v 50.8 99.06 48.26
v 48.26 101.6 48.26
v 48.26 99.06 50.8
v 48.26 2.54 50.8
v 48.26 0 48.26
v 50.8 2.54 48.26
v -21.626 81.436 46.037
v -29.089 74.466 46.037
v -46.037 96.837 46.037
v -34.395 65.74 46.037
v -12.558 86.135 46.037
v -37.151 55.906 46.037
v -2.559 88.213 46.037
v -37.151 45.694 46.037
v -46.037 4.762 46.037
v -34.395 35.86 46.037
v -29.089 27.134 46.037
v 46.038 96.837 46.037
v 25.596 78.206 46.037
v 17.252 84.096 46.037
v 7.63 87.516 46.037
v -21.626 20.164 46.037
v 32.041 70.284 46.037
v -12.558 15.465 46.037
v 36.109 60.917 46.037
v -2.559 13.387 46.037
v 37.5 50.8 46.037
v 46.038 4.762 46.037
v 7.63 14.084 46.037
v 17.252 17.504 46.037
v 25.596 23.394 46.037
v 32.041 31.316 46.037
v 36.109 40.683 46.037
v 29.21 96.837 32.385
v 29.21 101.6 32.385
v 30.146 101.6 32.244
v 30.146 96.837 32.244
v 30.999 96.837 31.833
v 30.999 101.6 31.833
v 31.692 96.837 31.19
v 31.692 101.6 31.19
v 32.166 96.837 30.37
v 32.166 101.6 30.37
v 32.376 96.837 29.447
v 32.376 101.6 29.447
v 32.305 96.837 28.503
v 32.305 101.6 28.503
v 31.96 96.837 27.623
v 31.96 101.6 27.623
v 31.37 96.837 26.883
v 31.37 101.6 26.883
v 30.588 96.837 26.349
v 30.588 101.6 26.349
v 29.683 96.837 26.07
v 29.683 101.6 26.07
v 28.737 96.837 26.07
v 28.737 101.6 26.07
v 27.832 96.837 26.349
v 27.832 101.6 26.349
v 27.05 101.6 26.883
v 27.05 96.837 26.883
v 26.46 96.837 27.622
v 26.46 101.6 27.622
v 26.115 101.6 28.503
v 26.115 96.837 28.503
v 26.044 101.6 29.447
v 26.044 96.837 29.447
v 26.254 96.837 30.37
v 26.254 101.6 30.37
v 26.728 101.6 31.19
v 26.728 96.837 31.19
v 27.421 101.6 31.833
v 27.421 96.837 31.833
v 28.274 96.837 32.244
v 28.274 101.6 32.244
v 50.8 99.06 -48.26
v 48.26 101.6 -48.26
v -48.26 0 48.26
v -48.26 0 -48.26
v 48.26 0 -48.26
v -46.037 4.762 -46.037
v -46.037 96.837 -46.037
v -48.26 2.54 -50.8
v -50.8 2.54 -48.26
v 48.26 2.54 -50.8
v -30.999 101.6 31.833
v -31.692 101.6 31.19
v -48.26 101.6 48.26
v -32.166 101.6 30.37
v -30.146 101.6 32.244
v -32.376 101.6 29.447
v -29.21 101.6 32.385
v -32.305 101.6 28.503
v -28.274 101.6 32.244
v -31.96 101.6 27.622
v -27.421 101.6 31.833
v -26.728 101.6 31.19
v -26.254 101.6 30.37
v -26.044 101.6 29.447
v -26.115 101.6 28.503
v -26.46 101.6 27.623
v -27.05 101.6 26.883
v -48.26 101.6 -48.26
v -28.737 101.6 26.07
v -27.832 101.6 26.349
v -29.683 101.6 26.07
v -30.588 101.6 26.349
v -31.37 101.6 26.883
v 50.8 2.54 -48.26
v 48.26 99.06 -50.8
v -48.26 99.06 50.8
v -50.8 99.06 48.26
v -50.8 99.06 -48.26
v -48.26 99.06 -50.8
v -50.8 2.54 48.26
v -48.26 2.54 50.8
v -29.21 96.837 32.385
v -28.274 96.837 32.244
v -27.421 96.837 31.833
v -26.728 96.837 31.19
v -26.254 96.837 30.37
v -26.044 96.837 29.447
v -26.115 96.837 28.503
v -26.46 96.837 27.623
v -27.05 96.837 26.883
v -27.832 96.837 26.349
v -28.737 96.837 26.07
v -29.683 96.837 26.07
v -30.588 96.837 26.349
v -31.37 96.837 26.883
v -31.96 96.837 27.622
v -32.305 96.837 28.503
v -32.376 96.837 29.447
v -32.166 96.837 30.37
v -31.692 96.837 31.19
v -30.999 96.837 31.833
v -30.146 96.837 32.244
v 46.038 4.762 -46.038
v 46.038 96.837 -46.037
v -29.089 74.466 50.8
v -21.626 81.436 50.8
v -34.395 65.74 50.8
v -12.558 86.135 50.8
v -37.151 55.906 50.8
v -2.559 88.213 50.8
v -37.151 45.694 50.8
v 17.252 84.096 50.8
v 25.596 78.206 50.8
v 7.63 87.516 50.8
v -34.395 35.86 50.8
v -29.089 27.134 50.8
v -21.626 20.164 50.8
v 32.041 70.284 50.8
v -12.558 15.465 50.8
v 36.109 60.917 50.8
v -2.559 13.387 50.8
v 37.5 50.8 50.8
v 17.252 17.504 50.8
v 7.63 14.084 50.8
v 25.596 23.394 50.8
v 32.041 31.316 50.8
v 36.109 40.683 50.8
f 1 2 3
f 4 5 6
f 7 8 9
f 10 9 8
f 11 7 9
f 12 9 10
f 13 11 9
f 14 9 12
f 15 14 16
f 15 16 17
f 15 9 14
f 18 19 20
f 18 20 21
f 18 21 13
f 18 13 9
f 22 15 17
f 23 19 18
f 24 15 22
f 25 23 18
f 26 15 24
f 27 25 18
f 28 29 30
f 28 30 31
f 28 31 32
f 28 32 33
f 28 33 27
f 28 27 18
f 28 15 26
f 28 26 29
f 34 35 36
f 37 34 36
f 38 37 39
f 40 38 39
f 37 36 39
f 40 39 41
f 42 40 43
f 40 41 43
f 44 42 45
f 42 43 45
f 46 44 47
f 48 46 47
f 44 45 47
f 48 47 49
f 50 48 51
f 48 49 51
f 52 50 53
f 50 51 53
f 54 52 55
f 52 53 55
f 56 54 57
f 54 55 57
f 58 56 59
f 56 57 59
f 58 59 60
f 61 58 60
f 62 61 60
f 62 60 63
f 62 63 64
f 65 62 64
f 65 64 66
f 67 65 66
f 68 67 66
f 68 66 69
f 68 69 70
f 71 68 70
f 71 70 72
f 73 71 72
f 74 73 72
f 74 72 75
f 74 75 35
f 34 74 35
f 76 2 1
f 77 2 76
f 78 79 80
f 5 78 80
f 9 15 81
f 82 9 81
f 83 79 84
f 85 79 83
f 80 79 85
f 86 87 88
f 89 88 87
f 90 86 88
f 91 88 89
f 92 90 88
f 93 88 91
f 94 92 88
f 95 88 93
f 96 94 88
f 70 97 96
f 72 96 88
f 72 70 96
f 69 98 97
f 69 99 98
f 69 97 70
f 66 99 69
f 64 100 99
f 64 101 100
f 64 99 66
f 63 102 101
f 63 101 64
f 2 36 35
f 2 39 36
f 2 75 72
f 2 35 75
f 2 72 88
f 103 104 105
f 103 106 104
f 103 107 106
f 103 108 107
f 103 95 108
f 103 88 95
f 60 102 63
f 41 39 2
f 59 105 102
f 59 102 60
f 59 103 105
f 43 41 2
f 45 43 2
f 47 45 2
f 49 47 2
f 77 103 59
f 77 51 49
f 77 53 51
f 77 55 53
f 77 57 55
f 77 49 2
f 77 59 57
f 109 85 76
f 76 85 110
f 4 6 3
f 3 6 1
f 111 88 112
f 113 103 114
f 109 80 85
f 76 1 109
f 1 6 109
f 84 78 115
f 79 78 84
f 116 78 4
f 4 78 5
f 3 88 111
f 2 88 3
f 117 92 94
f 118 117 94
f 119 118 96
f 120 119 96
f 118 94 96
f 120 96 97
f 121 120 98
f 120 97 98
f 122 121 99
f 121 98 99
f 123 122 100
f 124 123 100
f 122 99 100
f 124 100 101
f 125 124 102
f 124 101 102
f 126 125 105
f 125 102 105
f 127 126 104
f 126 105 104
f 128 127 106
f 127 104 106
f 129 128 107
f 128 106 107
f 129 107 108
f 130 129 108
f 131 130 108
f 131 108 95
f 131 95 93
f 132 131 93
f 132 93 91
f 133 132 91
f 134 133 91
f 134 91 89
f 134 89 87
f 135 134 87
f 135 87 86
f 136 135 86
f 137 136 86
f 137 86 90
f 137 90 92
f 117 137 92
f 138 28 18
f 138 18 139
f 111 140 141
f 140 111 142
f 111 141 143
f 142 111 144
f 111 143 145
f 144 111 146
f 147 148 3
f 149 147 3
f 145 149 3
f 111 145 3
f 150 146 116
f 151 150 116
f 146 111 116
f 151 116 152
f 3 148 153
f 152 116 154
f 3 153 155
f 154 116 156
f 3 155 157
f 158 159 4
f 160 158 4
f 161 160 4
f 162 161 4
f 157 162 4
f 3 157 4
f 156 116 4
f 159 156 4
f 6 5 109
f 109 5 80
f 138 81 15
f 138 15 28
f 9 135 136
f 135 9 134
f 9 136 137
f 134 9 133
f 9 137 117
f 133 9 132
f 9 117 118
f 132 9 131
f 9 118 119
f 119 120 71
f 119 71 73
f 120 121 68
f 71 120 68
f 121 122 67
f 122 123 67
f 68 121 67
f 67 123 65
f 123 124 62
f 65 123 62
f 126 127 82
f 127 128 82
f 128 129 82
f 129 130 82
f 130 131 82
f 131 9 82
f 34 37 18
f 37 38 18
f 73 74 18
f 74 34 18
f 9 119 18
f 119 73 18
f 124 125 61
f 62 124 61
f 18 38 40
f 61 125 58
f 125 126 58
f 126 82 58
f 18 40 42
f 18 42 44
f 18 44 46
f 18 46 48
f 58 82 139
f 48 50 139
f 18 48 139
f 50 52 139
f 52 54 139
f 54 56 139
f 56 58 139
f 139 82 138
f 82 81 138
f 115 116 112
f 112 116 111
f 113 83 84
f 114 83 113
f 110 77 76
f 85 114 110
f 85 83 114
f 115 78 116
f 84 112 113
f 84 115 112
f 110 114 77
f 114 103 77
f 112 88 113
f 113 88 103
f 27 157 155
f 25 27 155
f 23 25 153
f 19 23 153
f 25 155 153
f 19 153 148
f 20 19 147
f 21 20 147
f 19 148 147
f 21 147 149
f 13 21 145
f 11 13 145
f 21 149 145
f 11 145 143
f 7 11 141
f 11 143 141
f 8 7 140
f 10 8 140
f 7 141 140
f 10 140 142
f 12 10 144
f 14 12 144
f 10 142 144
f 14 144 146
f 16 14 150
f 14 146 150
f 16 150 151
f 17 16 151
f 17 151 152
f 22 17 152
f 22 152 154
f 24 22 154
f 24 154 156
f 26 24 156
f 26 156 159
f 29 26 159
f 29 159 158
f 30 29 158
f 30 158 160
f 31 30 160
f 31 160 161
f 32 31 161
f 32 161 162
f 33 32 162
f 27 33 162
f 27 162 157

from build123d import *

# Parameters (mm, degrees)
SKETCH1_W           = 101.6
SKETCH1_H           = 101.6
BOSS_EXTRUDE1_DEPTH = 101.6
CHAMFER1_SIZE       = 2.54
SHELL1_T            = 4.7625
CUT_EXTRUDE1_REACH  = 154.4
SKETCH2_R           = 37.5
CUT_EXTRUDE2_REACH  = 126.434
SKETCH3_R           = 3.175


with BuildPart() as part:
    # Sketch1 → Boss-Extrude1 (new body)
    with BuildSketch(Plane(origin=(0, 0, 0), x_dir=(1, 0, 0), z_dir=(0, 1, 0))):
        Rectangle(SKETCH1_W, SKETCH1_H)
    extrude(amount=BOSS_EXTRUDE1_DEPTH)

    # Chamfer1
    chamfer1_edges = [part.edges().sort_by_distance(p)[0] for p in [
        (50.8, 101.6, 0),
        (0, 101.6, -50.8),
        (-50.8, 101.6, 0),
        (0, 0, -50.8),
        (50.8, 0, 0),
        (0, 0, 50.8),
        (-50.8, 0, 0),
        (0, 101.6, 50.8),
        (-50.8, 50.8, -50.8),
        (50.8, 50.8, -50.8),
        (50.8, 50.8, 50.8),
        (-50.8, 50.8, 50.8),
    ]]
    chamfer(chamfer1_edges, length=CHAMFER1_SIZE)

    # Shell1 (no face opened: a closed hollow body)
    add(offset(amount=-SHELL1_T, mode=Mode.PRIVATE), mode=Mode.SUBTRACT)

    # Sketch2 → Cut-Extrude1 (cut, up to next)
    with BuildSketch(Plane.XY.offset(50.8), mode=Mode.PRIVATE) as cut_extrude1_sk1:
        with Locations((0, 50.8)):
            Circle(SKETCH2_R)
    cut_extrude1_tool1 = extrude(cut_extrude1_sk1.sketch, amount=-CUT_EXTRUDE1_REACH, mode=Mode.PRIVATE) & part.part
    add(cut_extrude1_tool1.solids().sort_by_distance((0, 50.8, 50.8))[0], mode=Mode.SUBTRACT)

    # Sketch3 → Cut-Extrude2 (cut, up to next)
    with BuildSketch(Plane(origin=(0, 101.6, 0), x_dir=(1, 0, 0), z_dir=(0, 1, 0)), mode=Mode.PRIVATE) as cut_extrude2_sk1:
        with Locations(Location((-29.21, -29.21, 0), (0, 0, 270))):
            Circle(SKETCH3_R)
    cut_extrude2_tool1 = extrude(cut_extrude2_sk1.sketch, amount=-CUT_EXTRUDE2_REACH, mode=Mode.PRIVATE) & part.part
    # Sketch3 → Cut-Extrude2 (cut, up to next)
    with BuildSketch(Plane(origin=(0, 101.6, 0), x_dir=(1, 0, 0), z_dir=(0, 1, 0)), mode=Mode.PRIVATE) as cut_extrude2_sk2:
        with Locations(Location((29.21, -29.21, 0), (0, 0, 270))):
            Circle(SKETCH3_R)
    cut_extrude2_tool2 = extrude(cut_extrude2_sk2.sketch, amount=-CUT_EXTRUDE2_REACH, mode=Mode.PRIVATE) & part.part
    add(cut_extrude2_tool1.solids().sort_by_distance((-29.21, 101.6, 29.21))[0], mode=Mode.SUBTRACT)
    add(cut_extrude2_tool2.solids().sort_by_distance((29.21, 101.6, 29.21))[0], mode=Mode.SUBTRACT)


solid = part.part
